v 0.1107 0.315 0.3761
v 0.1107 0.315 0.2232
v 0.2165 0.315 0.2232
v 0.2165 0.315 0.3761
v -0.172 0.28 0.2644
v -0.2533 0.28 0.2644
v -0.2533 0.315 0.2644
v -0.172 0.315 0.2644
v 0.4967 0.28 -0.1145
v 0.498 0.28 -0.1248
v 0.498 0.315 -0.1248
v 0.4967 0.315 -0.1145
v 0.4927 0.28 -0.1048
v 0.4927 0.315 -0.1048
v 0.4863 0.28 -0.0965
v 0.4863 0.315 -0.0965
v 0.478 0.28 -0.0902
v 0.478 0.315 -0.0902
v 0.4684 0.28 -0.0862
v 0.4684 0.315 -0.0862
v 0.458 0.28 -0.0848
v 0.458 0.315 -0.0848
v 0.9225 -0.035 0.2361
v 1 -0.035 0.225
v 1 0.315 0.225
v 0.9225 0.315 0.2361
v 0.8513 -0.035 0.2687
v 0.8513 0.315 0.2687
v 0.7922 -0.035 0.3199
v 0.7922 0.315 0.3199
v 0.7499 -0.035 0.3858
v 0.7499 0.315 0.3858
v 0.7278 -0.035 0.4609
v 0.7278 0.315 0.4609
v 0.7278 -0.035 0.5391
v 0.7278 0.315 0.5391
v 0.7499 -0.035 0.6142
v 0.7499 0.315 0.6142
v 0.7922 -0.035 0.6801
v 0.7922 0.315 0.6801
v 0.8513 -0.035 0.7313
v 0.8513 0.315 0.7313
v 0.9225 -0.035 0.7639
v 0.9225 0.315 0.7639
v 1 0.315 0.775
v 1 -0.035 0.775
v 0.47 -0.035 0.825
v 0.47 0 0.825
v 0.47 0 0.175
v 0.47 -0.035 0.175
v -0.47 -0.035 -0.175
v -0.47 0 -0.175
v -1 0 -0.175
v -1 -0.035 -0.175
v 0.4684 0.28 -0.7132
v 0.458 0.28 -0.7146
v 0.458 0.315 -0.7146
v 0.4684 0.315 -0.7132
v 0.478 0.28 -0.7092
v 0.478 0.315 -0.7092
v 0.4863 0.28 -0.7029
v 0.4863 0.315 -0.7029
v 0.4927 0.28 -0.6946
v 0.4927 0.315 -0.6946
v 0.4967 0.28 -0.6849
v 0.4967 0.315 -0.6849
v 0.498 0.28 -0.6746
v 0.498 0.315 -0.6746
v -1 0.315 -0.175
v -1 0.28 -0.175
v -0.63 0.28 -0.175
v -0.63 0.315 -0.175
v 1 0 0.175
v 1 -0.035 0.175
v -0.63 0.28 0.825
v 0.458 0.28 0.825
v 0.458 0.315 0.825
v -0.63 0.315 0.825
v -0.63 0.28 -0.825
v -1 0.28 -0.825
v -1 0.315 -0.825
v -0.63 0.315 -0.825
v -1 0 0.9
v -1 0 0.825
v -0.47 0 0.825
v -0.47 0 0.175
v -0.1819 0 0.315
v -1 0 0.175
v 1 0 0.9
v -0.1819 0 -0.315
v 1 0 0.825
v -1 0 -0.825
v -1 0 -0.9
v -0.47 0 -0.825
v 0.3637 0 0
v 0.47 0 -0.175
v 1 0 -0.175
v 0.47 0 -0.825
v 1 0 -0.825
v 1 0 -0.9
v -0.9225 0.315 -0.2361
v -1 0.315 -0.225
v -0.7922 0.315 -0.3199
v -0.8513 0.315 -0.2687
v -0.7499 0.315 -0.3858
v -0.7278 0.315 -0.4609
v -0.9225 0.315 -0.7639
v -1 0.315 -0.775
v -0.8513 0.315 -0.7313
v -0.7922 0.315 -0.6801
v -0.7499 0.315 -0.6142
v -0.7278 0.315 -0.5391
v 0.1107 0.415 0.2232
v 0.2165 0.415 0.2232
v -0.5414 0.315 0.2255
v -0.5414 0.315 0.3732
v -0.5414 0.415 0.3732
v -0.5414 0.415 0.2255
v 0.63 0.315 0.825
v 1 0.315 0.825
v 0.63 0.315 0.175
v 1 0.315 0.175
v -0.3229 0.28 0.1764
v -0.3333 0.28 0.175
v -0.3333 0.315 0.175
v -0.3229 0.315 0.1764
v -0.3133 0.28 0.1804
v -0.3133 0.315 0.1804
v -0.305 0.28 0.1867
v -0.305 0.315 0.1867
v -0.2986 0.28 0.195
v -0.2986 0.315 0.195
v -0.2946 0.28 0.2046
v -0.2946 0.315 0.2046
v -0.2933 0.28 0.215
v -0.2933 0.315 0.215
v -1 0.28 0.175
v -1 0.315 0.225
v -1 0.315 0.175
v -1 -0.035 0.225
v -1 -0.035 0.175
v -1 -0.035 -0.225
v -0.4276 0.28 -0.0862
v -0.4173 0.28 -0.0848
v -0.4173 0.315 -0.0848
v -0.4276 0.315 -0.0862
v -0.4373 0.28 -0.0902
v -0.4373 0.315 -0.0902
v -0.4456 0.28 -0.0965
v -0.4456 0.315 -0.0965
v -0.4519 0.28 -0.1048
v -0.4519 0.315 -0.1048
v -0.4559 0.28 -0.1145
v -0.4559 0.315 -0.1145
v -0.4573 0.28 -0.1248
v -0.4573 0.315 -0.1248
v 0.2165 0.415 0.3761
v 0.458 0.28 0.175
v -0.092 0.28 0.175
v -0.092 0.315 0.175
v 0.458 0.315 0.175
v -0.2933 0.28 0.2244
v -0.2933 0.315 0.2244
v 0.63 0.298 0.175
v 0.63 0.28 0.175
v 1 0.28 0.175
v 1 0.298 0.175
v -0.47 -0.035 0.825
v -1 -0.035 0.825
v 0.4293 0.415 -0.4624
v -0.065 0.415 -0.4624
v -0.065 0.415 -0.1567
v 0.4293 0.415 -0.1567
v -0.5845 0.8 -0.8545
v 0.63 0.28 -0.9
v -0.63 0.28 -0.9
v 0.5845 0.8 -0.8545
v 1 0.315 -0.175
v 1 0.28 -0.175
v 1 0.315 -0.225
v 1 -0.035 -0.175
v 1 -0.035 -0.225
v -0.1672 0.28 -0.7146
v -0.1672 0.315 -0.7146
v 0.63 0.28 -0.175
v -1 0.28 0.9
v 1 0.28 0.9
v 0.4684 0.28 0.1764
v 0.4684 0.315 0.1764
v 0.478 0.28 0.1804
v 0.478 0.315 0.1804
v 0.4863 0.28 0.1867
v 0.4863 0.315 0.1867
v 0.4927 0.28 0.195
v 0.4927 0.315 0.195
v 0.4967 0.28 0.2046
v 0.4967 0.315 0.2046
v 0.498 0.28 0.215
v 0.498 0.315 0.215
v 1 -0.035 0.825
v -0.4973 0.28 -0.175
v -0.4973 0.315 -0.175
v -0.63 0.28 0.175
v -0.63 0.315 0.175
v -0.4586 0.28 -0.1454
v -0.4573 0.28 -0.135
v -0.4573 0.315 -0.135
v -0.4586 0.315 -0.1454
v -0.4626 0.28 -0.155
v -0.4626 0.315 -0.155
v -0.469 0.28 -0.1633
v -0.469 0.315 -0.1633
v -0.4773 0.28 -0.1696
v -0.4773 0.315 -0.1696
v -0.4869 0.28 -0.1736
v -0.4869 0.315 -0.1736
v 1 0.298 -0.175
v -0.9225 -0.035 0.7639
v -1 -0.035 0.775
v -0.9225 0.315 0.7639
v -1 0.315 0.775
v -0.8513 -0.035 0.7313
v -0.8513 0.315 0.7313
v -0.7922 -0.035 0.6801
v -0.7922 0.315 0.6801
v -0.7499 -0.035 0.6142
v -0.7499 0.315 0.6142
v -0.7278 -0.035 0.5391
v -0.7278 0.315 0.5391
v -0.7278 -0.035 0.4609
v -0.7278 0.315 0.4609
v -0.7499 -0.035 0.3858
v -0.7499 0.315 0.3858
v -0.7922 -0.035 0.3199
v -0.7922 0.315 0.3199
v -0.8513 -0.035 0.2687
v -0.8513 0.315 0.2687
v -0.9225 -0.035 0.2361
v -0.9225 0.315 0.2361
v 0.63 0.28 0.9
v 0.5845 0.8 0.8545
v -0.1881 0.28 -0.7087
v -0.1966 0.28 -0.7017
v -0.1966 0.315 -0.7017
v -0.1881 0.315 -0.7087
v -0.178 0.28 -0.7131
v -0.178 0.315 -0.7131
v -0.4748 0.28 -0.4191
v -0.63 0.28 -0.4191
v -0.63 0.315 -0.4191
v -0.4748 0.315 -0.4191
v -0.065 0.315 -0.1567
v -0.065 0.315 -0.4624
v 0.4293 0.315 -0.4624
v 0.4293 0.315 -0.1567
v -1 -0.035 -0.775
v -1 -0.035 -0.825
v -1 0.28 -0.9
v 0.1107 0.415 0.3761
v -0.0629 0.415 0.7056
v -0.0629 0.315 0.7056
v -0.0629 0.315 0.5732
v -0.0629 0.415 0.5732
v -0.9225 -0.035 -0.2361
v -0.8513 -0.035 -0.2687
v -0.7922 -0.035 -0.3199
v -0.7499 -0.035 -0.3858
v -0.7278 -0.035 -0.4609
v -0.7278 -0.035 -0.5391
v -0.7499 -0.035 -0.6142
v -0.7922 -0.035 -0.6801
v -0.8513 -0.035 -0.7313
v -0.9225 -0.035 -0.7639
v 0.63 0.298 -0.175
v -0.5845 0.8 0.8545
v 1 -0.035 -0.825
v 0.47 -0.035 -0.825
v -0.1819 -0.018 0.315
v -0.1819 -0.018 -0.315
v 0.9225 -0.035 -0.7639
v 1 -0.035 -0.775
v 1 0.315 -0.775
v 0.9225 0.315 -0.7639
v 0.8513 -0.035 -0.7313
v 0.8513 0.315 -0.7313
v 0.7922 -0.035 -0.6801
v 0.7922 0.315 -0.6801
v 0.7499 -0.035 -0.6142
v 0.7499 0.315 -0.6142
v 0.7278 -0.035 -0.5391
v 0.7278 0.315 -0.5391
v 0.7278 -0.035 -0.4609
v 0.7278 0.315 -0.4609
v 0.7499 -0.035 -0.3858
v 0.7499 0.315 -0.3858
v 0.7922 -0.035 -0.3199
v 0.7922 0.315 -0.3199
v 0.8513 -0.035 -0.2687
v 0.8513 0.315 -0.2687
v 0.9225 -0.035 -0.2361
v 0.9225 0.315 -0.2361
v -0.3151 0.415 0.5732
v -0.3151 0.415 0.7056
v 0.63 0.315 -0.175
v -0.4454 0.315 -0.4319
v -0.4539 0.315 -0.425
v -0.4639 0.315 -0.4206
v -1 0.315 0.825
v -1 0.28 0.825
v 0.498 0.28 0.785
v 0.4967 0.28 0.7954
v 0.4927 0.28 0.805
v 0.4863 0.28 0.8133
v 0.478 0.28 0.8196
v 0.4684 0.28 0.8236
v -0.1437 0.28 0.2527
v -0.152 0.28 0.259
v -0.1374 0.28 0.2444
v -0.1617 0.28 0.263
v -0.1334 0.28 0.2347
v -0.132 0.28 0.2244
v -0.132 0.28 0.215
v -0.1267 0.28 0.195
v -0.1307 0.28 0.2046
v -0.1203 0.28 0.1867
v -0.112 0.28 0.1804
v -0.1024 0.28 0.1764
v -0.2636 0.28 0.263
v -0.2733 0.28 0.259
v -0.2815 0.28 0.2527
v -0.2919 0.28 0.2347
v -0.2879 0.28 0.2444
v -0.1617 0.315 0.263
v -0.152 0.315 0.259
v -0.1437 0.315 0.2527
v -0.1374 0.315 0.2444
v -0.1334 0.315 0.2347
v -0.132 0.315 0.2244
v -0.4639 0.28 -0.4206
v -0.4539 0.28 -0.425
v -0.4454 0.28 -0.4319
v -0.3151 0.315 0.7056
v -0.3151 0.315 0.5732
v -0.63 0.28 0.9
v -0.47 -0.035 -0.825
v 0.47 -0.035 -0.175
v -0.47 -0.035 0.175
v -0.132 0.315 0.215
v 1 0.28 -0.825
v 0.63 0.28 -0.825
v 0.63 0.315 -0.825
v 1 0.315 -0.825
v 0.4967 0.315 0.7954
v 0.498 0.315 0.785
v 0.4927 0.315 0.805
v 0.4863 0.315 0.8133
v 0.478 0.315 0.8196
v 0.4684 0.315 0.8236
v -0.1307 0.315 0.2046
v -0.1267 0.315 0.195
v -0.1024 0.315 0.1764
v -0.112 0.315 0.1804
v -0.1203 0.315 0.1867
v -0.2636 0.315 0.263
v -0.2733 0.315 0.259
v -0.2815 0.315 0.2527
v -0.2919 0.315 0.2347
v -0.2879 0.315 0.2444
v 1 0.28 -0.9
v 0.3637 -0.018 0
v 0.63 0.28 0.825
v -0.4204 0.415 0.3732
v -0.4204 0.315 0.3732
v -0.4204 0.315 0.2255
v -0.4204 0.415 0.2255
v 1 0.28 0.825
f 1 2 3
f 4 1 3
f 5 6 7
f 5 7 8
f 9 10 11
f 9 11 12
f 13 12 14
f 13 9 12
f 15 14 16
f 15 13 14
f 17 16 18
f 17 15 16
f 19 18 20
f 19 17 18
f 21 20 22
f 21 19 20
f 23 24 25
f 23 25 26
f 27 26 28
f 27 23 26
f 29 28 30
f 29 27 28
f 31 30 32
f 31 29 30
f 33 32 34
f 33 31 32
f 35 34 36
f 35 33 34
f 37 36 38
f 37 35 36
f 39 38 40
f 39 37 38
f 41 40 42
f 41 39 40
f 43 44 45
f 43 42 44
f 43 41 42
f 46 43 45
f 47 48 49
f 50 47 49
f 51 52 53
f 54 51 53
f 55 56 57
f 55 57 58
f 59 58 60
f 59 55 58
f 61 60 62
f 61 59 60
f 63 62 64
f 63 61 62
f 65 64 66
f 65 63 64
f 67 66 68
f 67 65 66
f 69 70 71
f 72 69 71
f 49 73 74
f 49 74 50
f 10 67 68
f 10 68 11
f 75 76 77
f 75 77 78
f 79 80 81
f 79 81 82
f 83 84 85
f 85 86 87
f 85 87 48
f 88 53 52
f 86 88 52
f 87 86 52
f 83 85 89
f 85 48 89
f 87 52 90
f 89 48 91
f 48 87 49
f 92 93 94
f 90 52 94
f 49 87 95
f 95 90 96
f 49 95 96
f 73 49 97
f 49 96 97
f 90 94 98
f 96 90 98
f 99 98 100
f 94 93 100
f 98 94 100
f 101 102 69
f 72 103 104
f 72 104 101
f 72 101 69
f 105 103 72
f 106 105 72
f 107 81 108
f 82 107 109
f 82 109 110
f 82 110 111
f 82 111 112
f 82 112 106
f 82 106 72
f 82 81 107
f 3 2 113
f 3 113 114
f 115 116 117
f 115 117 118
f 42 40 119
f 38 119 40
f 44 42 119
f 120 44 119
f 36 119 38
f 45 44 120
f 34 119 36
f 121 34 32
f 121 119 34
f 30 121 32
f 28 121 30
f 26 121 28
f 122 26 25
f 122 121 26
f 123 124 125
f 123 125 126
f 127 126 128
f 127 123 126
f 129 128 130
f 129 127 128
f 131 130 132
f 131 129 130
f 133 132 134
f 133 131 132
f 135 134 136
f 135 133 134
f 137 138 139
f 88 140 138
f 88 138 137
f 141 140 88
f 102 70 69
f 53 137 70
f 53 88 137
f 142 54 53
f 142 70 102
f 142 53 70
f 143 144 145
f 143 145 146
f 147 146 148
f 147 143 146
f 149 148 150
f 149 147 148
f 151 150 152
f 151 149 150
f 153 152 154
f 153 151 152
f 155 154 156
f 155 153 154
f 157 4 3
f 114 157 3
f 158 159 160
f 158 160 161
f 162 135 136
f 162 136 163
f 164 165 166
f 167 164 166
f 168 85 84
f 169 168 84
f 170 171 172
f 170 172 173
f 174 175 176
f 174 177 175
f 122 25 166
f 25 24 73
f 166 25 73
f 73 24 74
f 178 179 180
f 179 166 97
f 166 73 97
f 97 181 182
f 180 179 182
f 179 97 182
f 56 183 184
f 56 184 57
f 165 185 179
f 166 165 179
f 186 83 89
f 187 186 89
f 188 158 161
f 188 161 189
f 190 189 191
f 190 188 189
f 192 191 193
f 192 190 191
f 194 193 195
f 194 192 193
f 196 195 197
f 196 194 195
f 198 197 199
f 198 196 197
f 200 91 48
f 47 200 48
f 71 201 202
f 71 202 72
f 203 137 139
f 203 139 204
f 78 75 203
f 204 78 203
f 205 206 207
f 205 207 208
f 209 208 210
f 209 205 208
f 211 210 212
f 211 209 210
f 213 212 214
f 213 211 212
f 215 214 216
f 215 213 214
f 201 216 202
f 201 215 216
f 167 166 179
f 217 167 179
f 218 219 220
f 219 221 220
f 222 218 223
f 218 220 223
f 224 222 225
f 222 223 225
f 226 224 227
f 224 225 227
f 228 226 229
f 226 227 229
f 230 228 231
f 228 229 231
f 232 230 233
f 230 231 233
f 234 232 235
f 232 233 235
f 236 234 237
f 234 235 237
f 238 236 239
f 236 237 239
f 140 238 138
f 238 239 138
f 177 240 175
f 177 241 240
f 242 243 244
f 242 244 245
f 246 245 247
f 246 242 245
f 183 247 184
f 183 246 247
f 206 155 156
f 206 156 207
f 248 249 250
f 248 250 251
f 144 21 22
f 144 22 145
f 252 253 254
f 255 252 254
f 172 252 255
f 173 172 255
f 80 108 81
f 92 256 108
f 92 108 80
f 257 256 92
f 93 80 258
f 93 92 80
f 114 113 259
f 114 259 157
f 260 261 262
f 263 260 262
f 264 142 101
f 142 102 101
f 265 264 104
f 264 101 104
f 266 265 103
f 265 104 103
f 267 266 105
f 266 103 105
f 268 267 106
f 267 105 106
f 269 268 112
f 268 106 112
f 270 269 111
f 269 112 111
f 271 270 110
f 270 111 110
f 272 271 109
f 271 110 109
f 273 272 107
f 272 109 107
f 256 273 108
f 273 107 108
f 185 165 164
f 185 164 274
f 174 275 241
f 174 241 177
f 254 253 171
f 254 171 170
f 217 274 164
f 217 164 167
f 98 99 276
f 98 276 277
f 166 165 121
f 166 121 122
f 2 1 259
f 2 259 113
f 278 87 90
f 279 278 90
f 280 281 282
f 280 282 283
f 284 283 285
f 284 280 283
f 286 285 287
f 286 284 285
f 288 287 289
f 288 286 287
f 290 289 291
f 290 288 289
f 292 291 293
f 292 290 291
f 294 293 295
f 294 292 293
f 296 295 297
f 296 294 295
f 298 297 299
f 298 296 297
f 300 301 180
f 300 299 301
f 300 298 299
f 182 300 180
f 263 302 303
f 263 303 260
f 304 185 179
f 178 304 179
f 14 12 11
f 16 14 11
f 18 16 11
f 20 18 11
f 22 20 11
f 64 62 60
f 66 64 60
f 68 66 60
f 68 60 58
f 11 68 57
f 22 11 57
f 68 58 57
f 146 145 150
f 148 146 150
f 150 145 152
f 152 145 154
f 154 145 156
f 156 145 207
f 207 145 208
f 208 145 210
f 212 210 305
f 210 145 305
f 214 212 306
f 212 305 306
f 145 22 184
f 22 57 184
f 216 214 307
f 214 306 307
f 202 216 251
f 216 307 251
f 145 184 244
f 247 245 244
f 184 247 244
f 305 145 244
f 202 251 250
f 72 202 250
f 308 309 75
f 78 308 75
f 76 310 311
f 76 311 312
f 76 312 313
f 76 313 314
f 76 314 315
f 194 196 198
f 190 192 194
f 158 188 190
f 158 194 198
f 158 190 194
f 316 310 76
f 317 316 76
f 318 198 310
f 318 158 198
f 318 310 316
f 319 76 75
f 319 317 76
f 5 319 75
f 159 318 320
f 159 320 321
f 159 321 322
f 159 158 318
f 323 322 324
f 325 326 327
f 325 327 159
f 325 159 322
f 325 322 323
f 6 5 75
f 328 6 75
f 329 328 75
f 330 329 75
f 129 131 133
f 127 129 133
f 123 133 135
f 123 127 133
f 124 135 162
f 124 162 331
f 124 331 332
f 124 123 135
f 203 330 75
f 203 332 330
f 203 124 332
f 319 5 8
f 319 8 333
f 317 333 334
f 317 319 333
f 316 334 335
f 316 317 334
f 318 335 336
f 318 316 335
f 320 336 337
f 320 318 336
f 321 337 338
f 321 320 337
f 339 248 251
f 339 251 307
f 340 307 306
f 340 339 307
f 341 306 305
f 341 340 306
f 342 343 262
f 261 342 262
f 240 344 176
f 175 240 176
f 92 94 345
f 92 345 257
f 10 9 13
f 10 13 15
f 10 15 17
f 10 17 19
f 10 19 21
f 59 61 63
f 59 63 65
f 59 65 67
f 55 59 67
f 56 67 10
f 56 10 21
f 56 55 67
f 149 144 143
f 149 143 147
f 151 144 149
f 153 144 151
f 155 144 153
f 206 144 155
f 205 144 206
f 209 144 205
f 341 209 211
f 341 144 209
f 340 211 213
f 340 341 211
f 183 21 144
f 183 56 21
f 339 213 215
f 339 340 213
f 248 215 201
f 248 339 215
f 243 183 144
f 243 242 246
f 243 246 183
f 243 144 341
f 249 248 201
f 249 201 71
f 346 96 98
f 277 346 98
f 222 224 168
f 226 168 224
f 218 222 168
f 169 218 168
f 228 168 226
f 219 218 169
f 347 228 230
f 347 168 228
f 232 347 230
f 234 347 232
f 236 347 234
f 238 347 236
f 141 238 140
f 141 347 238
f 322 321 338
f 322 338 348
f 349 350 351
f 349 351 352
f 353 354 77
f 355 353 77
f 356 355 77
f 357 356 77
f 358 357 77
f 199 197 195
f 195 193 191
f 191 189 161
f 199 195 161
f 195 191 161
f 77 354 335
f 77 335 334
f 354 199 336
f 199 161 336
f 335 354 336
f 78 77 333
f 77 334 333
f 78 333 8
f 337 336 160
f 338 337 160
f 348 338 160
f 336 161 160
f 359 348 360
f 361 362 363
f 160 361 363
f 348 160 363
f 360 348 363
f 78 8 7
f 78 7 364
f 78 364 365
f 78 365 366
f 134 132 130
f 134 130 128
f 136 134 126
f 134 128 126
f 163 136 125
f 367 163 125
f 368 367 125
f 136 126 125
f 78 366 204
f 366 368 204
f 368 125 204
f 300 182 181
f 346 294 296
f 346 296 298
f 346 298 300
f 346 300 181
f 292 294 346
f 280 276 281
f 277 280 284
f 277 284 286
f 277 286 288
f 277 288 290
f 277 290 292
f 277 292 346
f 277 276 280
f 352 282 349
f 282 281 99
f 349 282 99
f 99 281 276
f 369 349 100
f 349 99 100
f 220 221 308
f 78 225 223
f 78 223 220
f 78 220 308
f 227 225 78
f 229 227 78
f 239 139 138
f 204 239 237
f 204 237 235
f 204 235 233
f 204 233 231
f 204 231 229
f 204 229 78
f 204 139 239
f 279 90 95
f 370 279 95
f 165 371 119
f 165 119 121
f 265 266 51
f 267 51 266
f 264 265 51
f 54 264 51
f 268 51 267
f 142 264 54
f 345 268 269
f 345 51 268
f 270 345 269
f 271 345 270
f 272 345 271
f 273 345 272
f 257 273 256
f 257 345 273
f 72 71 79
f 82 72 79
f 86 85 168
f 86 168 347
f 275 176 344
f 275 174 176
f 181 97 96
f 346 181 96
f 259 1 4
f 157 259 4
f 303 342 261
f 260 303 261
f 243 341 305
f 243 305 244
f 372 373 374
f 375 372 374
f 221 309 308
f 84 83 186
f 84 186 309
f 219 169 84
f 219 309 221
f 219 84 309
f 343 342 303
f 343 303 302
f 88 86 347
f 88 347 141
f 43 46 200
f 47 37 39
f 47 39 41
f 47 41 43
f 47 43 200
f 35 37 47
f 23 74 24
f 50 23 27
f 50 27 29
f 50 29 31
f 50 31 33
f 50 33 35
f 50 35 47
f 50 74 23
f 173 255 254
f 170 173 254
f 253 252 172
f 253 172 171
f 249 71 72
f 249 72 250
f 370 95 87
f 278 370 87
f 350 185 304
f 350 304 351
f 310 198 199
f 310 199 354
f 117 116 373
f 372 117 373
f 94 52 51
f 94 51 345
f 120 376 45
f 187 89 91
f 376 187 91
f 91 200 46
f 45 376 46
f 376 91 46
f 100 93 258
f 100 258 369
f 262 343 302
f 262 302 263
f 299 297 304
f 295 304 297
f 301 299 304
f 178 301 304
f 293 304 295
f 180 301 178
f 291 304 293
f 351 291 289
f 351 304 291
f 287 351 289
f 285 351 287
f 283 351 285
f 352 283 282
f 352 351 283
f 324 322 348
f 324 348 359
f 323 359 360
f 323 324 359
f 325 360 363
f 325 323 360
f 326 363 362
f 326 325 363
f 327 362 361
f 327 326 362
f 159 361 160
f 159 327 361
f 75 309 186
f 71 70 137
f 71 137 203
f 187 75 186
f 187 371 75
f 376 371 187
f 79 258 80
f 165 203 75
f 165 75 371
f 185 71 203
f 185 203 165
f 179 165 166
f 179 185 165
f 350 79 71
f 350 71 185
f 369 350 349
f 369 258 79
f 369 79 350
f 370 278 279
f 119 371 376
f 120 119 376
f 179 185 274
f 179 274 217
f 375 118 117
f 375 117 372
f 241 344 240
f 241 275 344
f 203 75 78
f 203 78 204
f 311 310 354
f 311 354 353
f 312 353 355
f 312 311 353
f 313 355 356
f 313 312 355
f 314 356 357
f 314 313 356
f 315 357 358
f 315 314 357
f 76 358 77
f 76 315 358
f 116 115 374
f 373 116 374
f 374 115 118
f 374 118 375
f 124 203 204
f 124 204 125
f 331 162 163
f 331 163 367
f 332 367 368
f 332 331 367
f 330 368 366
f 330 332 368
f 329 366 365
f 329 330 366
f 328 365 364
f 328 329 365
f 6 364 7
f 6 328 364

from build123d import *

# Parameters (mm, degrees)
SKETCH_1_W               = 2
SKETCH_1_H               = 1.8
EXTRUDE_1_DEPTH          = 0.28
EXTRUDE_3_DEPTH          = 0.018
SKETCH_8_W               = 0.53
SKETCH_8_H               = 0.65
EXTRUDE_4_DEPTH          = 0.035
SKETCH_9_W               = 0.37
SKETCH_9_H               = 0.65
EXTRUDE_5_DEPTH          = 0.035
SKETCH_2_R               = 0.275
CUT_EXTRUDE_2_DEPTH      = 1.035
CUT_EXTRUDE_2_DEPTH_BACK = 1.315
SKETCH_13_W              = 1.26
SKETCH_13_H              = 1.8
EXTRUDE_9_DEPTH          = 0.52
EXTRUDE_9_TAPER          = 5
SKETCH_14_W              = 0.37
SKETCH_14_H              = 0.35
EXTRUDE_10_DEPTH         = 0.018
EXTRUDE_11_DEPTH         = 0.035
EXTRUDE_11_2_DEPTH       = 0.035
SKETCH_16_W              = 0.49422098
SKETCH_16_H              = 0.305703699
EXTRUDE_12_DEPTH         = 0.1
SKETCH_16_W_2            = 0.120985562
SKETCH_16_H_2            = 0.147756788
EXTRUDE_12_2_DEPTH       = 0.1
SKETCH_16_W_3            = 0.105722529
SKETCH_16_H_3            = 0.15285185
EXTRUDE_12_3_DEPTH       = 0.1
SKETCH_16_W_4            = 0.252205552
SKETCH_16_H_4            = 0.132471603
EXTRUDE_12_4_DEPTH       = 0.1


with BuildPart() as part:
    # Эскиз1 → Бобышка-Вытянуть1 (new body)
    with BuildSketch(Plane(origin=(0, 0, 0), x_dir=(1, 0, 0), z_dir=(0, 1, 0))):
        Rectangle(SKETCH_1_W, SKETCH_1_H)
    extrude(amount=EXTRUDE_1_DEPTH)

    # Эскиз7 → Бобышка-Вытянуть3 (add)
    with BuildSketch(Plane.XZ):
        Polygon((0.36373067, 0), (-0.181865335, 0.315), (-0.181865335, -0.315), align=None)
    extrude(amount=EXTRUDE_3_DEPTH)

    # Эскиз8 → Бобышка-Вытянуть4 (add)
    with BuildSketch(Plane(origin=(0, 0, 0), x_dir=(-1, 0, 0), z_dir=(0, -1, 0))):
        with Locations((-0.735, -0.5)):
            Rectangle(SKETCH_8_W, SKETCH_8_H)
        with Locations((0.735, -0.5)):
            Rectangle(SKETCH_8_W, SKETCH_8_H)
        with Locations((-0.735, 0.5)):
            Rectangle(SKETCH_8_W, SKETCH_8_H)
        with Locations((0.735, 0.5)):
            Rectangle(SKETCH_8_W, SKETCH_8_H)
    extrude(amount=EXTRUDE_4_DEPTH)

    # Эскиз9 → Бобышка-Вытянуть5 (add)
    with BuildSketch(Plane(origin=(0, 0.28, 0), x_dir=(1, 0, 0), z_dir=(0, 1, 0))):
        with Locations((0.815, -0.5)):
            Rectangle(SKETCH_9_W, SKETCH_9_H)
        with Locations((0.815, 0.5)):
            Rectangle(SKETCH_9_W, SKETCH_9_H)
        with Locations((-0.815, -0.5)):
            Rectangle(SKETCH_9_W, SKETCH_9_H)
        with Locations((-0.815, 0.5)):
            Rectangle(SKETCH_9_W, SKETCH_9_H)
    extrude(amount=EXTRUDE_5_DEPTH)

    # Эскиз2 → Вырез-Вытянуть2 (cut, two sides)
    with BuildSketch(Plane(origin=(0, 0.28, 0), x_dir=(1, 0, 0), z_dir=(0, 1, 0))) as cut_extrude_2_sk:
        with Locations((1, 0.5)):
            Circle(SKETCH_2_R)
        with Locations((1, -0.5)):
            Circle(SKETCH_2_R)
        with Locations((-1, 0.5)):
            Circle(SKETCH_2_R)
        with Locations((-1, -0.5)):
            Circle(SKETCH_2_R)
    extrude(amount=CUT_EXTRUDE_2_DEPTH, mode=Mode.SUBTRACT)
    extrude(cut_extrude_2_sk.sketch, amount=-CUT_EXTRUDE_2_DEPTH_BACK, mode=Mode.SUBTRACT)


with BuildPart() as body_2:
    # Эскиз13 → Бобышка-Вытянуть9 (new body)
    with BuildSketch(Plane(origin=(0, 0.28, 0), x_dir=(1, 0, 0), z_dir=(0, 1, 0))):
        Rectangle(SKETCH_13_W, SKETCH_13_H)
    extrude(amount=EXTRUDE_9_DEPTH, taper=EXTRUDE_9_TAPER)


with BuildPart() as body_3:
    # Эскиз14 → Бобышка-Вытянуть10 (new body)
    with BuildSketch(Plane(origin=(0, 0.28, 0), x_dir=(1, 0, 0), z_dir=(0, 1, 0))):
        with Locations((0.815, 0)):
            Rectangle(SKETCH_14_W, SKETCH_14_H)
    extrude(amount=EXTRUDE_10_DEPTH)


with BuildPart() as body_4:
    # Эскиз15 → Бобышка-Вытянуть11 (new body)
    with BuildSketch(Plane(origin=(0, 0.28, 0), x_dir=(1, 0, 0), z_dir=(0, 1, 0))):
        with BuildLine():
            Line((-0.63, 0.419068821), (-0.47480357, 0.419068821))
            ThreePointArc((-0.47480357, 0.419068821), (-0.458754068, 0.422429859), (-0.445401716, 0.431948146))
            Line((-0.445401716, 0.431948146), (-0.196576052, 0.701703072))
            ThreePointArc((-0.196576052, 0.701703072), (-0.1832237, 0.711221358), (-0.167174198, 0.714582397))
            Line((-0.167174198, 0.714582397), (0.458042276, 0.714582397))
            ThreePointArc((0.458042276, 0.714582397), (0.486326548, 0.702866668), (0.498042276, 0.674582397))
            Line((0.498042276, 0.674582397), (0.498042276, 0.124815207))
            ThreePointArc((0.498042276, 0.124815207), (0.486326548, 0.096530936), (0.458042276, 0.084815207))
            Line((0.458042276, 0.084815207), (-0.417281783, 0.084815207))
            ThreePointArc((-0.417281783, 0.084815207), (-0.445566054, 0.096530936), (-0.457281783, 0.124815207))
            Line((-0.457281783, 0.124815207), (-0.457281783, 0.135))
            ThreePointArc((-0.457281783, 0.135), (-0.468997512, 0.163284271), (-0.497281783, 0.175))
            Line((-0.497281783, 0.175), (-0.63, 0.175))
            Line((-0.63, 0.175), (-0.63, 0.419068821))
        make_face()
    extrude(amount=EXTRUDE_11_DEPTH)


with BuildPart() as body_5:
    # Эскиз15 → Extrude 11 2 (new body)
    with BuildSketch(Plane(origin=(0, 0.28, 0), x_dir=(1, 0, 0), z_dir=(0, 1, 0))):
        with BuildLine():
            Line((-0.63, -0.175), (-0.333250558, -0.175))
            ThreePointArc((-0.333250558, -0.175), (-0.304966287, -0.186715729), (-0.293250558, -0.215))
            Line((-0.293250558, -0.215), (-0.293250558, -0.224389621))
            ThreePointArc((-0.293250558, -0.224389621), (-0.28153483, -0.252673893), (-0.253250558, -0.264389621))
            Line((-0.253250558, -0.264389621), (-0.172018831, -0.264389621))
            ThreePointArc((-0.172018831, -0.264389621), (-0.14373456, -0.252673893), (-0.132018831, -0.224389621))
            Line((-0.132018831, -0.224389621), (-0.132018831, -0.215))
            ThreePointArc((-0.132018831, -0.215), (-0.120303102, -0.186715729), (-0.092018831, -0.175))
            Line((-0.092018831, -0.175), (0.458042276, -0.175))
            ThreePointArc((0.458042276, -0.175), (0.486326548, -0.186715729), (0.498042276, -0.215))
            Line((0.498042276, -0.215), (0.498042276, -0.785))
            ThreePointArc((0.498042276, -0.785), (0.486326548, -0.813284271), (0.458042276, -0.825))
            Line((0.458042276, -0.825), (-0.63, -0.825))
            Line((-0.63, -0.825), (-0.63, -0.175))
        make_face()
    extrude(amount=EXTRUDE_11_2_DEPTH)


with BuildPart() as body_6:
    # Эскиз16 → Бобышка-Вытянуть12 (new body)
    with BuildSketch(Plane(origin=(0, 0.315, 0), x_dir=(1, 0, 0), z_dir=(0, 1, 0))):
        with Locations((0.182148454, 0.309524996)):
            Rectangle(SKETCH_16_W, SKETCH_16_H)
    extrude(amount=EXTRUDE_12_DEPTH)


with BuildPart() as body_7:
    # Эскиз16 → Extrude 12 2 (new body)
    with BuildSketch(Plane(origin=(0, 0.315, 0), x_dir=(1, 0, 0), z_dir=(0, 1, 0))):
        with Locations((-0.480857519, -0.299334872)):
            Rectangle(SKETCH_16_W_2, SKETCH_16_H_2)
    extrude(amount=EXTRUDE_12_2_DEPTH)


with BuildPart() as body_8:
    # Эскиз16 → Extrude 12 3 (new body)
    with BuildSketch(Plane(origin=(0, 0.315, 0), x_dir=(1, 0, 0), z_dir=(0, 1, 0))):
        with Locations((0.163595889, -0.299669803)):
            Rectangle(SKETCH_16_W_3, SKETCH_16_H_3)
    extrude(amount=EXTRUDE_12_3_DEPTH)


with BuildPart() as body_9:
    # Эскиз16 → Extrude 12 4 (new body)
    with BuildSketch(Plane(origin=(0, 0.315, 0), x_dir=(1, 0, 0), z_dir=(0, 1, 0))):
        with Locations((-0.189041788, -0.639404851)):
            Rectangle(SKETCH_16_W_4, SKETCH_16_H_4)
    extrude(amount=EXTRUDE_12_4_DEPTH)


solid = Compound([part.part, body_2.part, body_3.part, body_4.part, body_5.part, body_6.part, body_7.part, body_8.part, body_9.part])
